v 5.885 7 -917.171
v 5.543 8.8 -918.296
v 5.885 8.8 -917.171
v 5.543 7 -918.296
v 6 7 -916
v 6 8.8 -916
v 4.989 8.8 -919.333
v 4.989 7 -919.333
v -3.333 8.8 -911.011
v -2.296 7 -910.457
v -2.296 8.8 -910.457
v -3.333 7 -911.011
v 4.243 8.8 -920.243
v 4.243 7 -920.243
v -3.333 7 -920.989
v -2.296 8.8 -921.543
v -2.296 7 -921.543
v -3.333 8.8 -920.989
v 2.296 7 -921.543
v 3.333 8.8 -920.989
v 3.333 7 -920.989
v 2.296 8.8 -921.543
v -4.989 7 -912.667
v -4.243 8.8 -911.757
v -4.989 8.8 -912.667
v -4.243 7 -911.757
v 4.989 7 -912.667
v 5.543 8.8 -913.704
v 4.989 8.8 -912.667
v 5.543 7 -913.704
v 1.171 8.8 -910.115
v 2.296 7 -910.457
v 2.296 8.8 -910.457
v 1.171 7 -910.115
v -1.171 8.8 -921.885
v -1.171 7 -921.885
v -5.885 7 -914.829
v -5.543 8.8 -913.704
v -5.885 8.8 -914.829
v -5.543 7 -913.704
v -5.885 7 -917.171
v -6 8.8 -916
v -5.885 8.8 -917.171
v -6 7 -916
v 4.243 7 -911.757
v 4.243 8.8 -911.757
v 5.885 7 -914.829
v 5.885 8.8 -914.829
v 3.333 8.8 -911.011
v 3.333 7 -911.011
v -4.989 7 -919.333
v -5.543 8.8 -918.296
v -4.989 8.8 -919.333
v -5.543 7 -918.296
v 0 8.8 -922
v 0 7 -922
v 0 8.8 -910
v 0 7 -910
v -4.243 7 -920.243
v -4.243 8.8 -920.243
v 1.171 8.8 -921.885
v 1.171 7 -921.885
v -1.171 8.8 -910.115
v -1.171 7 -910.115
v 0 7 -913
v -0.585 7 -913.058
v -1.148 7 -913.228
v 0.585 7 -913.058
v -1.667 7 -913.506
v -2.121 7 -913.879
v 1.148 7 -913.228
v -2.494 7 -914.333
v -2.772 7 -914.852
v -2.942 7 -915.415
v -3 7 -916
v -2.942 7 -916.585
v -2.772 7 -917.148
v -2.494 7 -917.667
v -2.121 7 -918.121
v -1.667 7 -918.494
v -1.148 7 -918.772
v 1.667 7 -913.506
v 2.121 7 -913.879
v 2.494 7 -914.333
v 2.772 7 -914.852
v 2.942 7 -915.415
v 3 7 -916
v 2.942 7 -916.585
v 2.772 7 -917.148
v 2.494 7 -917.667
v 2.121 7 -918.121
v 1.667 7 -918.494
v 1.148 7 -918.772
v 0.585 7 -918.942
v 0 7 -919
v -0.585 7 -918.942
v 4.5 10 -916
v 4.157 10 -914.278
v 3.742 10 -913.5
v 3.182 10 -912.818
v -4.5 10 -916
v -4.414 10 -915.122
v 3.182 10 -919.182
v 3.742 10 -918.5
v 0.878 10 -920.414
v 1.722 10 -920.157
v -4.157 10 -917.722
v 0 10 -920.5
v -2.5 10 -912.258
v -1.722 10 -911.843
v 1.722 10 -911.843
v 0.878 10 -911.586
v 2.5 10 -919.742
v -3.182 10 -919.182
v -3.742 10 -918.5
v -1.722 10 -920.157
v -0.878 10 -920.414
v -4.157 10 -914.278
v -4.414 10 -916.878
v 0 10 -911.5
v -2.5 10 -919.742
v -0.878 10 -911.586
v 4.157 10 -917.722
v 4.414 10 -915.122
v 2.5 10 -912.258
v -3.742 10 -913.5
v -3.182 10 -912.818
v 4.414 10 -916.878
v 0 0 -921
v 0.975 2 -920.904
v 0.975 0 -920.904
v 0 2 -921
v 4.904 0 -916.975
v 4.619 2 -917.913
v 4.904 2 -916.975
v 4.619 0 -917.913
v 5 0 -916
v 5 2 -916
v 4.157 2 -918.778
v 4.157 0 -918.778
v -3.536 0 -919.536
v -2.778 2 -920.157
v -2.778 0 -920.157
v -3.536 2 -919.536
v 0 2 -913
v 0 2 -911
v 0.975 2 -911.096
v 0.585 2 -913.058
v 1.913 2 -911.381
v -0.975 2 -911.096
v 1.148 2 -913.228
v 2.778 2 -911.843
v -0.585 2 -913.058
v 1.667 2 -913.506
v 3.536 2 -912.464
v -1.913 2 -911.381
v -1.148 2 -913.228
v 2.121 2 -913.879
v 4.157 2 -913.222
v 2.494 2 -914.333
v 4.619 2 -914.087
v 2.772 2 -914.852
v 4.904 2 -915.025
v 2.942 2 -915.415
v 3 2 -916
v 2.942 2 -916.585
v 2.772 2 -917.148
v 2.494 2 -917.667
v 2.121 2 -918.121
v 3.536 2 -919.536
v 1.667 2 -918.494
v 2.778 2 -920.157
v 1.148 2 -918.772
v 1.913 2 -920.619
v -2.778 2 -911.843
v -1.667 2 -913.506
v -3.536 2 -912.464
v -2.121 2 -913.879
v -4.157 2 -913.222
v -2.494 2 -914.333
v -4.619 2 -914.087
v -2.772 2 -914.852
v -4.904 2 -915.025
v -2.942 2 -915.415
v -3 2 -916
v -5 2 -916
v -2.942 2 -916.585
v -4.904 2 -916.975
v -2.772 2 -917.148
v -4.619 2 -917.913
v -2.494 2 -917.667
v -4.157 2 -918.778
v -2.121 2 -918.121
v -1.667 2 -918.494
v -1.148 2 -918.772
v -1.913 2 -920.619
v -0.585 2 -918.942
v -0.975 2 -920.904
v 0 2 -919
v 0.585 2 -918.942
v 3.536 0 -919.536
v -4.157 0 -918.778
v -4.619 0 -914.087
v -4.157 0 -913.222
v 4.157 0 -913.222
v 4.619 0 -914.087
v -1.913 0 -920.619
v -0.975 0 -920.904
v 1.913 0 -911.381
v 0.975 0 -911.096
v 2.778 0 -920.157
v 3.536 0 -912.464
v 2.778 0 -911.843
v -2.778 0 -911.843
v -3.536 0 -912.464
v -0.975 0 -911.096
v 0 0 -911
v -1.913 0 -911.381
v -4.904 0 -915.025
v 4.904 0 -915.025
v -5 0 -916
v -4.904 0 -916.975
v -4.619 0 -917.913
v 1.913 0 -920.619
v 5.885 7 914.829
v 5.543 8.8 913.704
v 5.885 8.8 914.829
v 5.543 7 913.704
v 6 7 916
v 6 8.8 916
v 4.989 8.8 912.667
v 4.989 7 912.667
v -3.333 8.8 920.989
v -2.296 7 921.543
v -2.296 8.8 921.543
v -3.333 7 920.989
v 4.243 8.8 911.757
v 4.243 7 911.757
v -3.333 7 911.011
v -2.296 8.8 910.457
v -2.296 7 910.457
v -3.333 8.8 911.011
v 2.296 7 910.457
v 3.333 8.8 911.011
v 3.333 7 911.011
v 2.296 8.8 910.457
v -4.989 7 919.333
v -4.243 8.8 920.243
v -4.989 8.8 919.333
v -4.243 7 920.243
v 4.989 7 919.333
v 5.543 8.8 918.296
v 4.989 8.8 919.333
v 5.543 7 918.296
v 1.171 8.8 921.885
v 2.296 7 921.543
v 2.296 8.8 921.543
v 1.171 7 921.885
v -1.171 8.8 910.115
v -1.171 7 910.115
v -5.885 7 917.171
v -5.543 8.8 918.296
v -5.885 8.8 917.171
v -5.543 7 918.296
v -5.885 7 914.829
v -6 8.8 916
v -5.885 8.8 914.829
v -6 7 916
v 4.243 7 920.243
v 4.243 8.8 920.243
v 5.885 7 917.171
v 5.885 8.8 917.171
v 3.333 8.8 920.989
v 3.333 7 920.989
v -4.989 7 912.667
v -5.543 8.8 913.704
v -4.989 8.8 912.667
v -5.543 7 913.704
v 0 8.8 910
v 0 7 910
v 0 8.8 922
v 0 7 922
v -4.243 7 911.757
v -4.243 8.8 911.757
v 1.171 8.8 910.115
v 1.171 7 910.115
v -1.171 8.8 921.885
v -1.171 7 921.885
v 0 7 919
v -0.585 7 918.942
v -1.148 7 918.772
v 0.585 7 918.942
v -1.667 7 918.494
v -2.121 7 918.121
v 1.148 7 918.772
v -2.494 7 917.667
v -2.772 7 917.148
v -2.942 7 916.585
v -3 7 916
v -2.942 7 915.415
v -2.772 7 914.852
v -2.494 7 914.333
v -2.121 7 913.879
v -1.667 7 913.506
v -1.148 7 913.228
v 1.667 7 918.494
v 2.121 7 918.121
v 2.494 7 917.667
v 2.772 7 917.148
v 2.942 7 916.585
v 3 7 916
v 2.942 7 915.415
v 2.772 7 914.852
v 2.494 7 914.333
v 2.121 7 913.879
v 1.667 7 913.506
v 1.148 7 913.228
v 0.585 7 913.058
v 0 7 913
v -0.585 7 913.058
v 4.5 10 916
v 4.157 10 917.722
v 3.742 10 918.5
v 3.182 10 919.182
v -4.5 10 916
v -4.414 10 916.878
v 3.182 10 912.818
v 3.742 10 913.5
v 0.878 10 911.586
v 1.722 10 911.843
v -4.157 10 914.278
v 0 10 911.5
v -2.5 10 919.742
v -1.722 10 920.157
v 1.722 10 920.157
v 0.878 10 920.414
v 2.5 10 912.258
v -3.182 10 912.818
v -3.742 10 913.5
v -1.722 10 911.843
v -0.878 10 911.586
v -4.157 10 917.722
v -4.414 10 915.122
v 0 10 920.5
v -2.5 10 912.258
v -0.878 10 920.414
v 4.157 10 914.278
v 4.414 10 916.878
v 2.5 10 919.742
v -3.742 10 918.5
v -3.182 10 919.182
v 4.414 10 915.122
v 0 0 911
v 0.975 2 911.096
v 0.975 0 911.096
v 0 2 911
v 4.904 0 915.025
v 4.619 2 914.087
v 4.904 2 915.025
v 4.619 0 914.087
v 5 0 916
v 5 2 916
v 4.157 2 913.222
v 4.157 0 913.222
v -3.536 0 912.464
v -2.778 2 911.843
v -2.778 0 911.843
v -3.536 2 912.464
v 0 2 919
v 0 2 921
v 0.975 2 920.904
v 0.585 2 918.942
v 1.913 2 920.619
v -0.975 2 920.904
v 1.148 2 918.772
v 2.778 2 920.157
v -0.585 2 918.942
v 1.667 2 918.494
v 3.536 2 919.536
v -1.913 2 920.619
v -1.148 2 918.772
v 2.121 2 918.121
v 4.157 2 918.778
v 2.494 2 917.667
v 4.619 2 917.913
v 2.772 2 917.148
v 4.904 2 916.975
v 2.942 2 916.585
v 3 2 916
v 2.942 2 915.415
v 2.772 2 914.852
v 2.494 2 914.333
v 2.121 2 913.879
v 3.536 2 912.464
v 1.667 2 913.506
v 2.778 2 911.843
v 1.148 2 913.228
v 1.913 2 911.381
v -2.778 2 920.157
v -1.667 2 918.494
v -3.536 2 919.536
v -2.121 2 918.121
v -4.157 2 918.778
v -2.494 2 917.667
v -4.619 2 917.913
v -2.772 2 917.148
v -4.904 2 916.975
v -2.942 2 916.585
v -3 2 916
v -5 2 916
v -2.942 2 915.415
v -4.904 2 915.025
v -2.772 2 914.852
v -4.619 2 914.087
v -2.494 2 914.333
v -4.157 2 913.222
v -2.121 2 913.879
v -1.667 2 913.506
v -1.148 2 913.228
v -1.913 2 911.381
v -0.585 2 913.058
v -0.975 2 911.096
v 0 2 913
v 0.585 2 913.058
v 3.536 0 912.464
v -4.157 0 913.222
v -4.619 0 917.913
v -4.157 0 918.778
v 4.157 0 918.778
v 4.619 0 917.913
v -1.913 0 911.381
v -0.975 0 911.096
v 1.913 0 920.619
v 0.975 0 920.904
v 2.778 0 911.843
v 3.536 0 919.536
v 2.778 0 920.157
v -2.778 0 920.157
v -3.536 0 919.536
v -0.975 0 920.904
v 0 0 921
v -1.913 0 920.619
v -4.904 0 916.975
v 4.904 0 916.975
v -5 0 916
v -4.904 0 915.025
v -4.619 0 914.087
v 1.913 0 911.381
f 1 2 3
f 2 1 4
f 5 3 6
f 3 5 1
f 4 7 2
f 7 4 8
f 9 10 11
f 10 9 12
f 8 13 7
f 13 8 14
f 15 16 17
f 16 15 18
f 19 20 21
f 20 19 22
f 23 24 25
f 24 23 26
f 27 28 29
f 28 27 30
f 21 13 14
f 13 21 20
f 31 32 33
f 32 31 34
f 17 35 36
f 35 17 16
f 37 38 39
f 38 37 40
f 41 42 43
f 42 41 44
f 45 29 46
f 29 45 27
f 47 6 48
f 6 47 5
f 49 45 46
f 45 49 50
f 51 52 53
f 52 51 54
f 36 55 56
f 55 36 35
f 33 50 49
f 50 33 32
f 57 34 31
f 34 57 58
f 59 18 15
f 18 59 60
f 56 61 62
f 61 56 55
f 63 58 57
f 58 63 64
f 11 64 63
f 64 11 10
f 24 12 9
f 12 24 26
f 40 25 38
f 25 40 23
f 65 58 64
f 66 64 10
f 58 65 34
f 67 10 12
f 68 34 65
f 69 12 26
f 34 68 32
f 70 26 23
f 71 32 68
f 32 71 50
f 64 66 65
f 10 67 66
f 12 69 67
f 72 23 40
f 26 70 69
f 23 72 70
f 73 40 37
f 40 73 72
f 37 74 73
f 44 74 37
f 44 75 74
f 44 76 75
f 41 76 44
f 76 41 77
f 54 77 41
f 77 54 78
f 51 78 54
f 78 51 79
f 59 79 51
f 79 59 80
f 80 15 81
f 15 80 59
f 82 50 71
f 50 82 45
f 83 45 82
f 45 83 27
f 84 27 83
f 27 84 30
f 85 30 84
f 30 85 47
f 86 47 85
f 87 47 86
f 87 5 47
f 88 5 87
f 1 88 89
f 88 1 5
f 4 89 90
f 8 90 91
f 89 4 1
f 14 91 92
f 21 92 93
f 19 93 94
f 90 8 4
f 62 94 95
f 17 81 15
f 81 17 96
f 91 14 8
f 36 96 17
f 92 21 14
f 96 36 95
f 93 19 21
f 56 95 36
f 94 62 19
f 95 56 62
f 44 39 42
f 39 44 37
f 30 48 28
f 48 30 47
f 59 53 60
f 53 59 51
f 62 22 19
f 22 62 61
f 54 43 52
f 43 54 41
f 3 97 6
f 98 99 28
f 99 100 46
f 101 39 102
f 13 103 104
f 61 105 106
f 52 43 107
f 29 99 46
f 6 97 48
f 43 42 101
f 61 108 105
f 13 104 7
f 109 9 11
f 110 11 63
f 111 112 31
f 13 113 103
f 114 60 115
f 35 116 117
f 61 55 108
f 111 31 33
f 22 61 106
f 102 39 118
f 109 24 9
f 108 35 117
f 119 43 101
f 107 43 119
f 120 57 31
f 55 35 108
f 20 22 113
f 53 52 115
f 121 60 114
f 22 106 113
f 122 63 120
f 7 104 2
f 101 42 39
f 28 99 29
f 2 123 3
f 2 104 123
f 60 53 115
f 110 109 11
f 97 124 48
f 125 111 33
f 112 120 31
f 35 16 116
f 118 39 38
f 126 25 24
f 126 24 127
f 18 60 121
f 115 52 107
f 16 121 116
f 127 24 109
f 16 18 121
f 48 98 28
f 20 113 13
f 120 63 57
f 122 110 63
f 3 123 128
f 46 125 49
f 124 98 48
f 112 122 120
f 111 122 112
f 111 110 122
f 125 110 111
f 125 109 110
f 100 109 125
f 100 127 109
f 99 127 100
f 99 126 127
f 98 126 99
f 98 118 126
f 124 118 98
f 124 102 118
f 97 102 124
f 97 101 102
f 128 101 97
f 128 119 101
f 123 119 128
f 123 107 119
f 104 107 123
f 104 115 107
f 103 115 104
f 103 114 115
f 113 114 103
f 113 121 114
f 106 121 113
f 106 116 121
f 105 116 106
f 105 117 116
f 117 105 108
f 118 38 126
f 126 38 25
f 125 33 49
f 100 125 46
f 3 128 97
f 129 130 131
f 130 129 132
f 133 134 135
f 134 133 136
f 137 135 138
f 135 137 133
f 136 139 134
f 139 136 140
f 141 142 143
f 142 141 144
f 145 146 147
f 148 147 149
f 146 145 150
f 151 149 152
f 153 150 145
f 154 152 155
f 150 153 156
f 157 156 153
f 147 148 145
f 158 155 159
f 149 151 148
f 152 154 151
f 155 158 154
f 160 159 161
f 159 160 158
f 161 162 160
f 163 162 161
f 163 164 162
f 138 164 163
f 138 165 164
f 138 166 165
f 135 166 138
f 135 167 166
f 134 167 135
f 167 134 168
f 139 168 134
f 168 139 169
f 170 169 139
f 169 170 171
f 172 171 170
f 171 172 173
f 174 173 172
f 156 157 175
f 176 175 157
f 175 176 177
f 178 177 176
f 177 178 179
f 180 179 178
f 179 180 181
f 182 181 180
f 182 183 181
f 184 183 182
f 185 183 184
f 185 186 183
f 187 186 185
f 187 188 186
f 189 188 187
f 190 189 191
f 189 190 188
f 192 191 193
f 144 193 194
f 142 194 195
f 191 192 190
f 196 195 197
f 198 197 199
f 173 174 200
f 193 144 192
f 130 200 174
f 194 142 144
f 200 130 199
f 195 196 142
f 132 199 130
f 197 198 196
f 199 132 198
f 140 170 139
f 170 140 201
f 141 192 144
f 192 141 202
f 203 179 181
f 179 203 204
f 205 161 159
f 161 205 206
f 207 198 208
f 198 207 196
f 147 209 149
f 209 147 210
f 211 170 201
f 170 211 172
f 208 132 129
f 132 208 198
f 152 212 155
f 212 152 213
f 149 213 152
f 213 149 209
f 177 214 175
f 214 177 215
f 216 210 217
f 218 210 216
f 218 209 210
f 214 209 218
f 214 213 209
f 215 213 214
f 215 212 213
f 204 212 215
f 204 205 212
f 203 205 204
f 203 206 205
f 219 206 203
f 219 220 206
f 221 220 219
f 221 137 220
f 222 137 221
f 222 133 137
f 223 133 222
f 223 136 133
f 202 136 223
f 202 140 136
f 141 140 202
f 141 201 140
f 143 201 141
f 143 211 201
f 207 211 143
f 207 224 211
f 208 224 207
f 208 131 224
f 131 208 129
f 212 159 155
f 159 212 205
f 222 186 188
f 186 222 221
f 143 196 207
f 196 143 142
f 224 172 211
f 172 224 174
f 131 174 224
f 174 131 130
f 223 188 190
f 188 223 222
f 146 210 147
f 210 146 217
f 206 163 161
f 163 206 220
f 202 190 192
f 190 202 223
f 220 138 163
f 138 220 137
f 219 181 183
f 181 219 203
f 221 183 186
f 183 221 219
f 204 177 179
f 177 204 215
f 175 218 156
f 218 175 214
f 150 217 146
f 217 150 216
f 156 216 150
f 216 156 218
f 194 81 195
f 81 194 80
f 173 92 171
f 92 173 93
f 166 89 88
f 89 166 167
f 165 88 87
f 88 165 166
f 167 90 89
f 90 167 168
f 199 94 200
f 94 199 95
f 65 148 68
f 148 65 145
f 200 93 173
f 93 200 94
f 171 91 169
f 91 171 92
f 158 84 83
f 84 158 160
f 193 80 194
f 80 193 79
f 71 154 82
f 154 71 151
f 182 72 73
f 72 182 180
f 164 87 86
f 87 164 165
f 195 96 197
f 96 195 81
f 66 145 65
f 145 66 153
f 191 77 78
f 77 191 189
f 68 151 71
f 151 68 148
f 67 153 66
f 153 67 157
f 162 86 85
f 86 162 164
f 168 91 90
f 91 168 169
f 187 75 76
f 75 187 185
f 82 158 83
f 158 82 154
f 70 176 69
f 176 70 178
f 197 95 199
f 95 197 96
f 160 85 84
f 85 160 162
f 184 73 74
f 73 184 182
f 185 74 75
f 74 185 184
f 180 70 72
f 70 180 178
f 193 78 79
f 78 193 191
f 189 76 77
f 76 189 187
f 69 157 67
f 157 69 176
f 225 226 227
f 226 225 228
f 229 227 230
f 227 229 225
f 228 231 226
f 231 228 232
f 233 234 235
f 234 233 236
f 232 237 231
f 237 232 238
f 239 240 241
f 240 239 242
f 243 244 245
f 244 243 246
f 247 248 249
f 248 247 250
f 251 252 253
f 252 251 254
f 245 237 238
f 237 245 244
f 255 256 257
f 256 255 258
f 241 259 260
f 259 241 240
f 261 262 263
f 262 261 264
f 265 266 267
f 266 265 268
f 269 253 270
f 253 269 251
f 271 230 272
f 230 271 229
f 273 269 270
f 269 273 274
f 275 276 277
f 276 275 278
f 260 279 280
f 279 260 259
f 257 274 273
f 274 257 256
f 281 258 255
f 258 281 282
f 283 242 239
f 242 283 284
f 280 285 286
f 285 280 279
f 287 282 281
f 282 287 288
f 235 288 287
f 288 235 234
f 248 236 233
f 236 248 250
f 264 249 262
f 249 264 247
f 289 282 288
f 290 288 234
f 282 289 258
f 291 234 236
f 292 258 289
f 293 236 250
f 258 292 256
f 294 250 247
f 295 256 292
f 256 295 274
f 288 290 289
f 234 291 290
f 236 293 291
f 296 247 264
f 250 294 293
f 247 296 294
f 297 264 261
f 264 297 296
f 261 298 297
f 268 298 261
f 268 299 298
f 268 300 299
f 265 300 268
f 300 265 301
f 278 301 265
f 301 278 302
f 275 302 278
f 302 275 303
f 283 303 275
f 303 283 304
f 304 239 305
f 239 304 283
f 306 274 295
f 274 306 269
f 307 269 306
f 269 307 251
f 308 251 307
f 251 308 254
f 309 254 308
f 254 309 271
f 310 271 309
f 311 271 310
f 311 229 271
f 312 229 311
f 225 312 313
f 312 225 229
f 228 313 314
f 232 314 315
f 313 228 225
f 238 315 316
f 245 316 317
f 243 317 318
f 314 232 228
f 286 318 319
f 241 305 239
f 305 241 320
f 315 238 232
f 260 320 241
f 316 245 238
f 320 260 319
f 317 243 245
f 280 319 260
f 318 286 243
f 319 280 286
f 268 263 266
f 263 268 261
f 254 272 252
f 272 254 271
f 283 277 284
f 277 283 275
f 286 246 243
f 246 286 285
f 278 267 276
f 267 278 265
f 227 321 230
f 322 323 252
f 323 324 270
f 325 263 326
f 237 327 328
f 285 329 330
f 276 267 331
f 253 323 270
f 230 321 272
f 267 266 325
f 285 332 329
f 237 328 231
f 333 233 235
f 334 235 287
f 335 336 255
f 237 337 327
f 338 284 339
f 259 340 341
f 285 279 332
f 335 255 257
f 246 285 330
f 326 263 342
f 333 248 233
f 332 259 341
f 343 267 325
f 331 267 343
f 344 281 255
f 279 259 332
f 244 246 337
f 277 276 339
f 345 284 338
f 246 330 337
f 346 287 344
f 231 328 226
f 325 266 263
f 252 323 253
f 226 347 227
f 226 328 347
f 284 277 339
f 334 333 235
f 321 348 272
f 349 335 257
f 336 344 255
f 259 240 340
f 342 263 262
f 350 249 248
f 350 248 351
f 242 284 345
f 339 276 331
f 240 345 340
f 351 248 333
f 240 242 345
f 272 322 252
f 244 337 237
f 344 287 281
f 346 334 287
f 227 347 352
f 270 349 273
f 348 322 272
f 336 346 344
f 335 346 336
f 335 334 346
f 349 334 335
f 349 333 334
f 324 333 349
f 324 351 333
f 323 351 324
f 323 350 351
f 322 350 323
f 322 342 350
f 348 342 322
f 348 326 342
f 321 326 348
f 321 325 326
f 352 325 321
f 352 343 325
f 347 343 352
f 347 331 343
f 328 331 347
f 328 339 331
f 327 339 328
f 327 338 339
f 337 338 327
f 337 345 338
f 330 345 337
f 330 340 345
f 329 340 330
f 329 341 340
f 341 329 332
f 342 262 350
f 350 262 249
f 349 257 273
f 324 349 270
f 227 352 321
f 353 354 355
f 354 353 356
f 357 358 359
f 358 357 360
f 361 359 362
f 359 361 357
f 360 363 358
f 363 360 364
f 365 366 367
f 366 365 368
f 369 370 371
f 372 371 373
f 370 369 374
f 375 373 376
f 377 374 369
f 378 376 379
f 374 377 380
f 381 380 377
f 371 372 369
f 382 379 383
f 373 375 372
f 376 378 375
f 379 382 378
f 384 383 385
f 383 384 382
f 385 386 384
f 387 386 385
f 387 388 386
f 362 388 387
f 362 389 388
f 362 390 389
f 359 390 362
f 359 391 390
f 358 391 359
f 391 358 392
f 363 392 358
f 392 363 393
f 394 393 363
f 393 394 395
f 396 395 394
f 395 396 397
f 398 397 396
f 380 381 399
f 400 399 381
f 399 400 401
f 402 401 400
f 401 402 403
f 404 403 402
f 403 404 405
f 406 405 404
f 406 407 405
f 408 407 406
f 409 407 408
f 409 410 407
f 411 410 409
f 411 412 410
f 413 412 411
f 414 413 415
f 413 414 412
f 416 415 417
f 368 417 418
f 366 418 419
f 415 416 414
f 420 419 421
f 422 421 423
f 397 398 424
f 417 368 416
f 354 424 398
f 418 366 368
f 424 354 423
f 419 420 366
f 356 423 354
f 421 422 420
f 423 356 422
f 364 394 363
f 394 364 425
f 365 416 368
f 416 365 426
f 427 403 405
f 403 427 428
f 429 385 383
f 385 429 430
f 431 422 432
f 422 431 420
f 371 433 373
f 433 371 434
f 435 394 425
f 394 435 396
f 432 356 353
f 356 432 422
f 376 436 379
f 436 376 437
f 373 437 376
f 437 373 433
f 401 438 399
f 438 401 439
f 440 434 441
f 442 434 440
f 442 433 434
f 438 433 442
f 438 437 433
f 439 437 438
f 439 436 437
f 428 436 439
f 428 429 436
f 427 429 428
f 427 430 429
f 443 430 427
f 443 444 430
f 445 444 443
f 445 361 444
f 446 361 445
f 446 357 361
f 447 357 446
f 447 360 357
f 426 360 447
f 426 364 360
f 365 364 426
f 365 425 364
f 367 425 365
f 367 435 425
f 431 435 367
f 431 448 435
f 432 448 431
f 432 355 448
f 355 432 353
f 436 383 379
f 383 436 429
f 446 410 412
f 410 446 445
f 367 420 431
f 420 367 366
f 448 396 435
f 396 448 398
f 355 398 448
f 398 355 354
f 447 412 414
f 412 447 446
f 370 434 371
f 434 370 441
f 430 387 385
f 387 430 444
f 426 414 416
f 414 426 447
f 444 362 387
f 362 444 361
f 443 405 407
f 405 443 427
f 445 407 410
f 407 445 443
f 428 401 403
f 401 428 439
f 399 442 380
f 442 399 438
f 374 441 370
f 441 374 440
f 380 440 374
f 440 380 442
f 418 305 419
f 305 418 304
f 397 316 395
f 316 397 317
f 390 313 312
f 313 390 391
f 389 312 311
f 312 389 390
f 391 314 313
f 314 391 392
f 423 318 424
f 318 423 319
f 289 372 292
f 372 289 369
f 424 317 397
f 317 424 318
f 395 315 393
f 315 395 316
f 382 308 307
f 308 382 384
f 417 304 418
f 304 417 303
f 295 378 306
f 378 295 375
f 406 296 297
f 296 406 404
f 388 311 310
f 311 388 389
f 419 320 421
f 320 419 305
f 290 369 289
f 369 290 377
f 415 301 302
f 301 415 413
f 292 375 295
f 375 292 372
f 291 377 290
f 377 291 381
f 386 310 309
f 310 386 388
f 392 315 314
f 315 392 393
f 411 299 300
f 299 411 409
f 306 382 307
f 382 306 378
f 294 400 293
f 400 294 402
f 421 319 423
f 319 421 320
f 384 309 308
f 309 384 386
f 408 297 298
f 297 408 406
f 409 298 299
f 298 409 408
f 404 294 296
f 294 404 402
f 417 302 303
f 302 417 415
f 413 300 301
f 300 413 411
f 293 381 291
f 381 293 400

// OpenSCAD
// =====================================================================
// sub_mounting_pegs.scad
// APC NetShelter Rack PDU Advanced 100A (APDU11590SM)
// 2x toolless round mounting button (rear side, pitch 1832.0 mm)
// Origin: bidang muka belakang chassis (Y=0), sumbu peg ke +Y,
//         Z=0 di tengah jarak kedua peg.
// =====================================================================

$fn = 32;

PEG_SPACING = 1832.0;    // jarak center-to-center vertikal
PEG_HEAD_DIA = 12.0;     // kepala jamur
PEG_HEAD_T = 3.0;
PEG_NECK_DIA = 6.0;
PEG_NECK_H = 5.0;
PEG_BASE_DIA = 10.0;
PEG_BASE_T = 2.0;

module mounting_peg() {
    col = [0.55, 0.56, 0.58];   // baja seng
    color(col)
        rotate([-90, 0, 0]) {   // sumbu silinder -> +Y
            // basis
            cylinder(d = PEG_BASE_DIA, h = PEG_BASE_T);
            // leher
            translate([0, 0, PEG_BASE_T])
                cylinder(d = PEG_NECK_DIA, h = PEG_NECK_H);
            // kepala jamur dengan chamfer atas
            translate([0, 0, PEG_BASE_T + PEG_NECK_H]) {
                cylinder(d = PEG_HEAD_DIA, h = PEG_HEAD_T - 1.2);
                translate([0, 0, PEG_HEAD_T - 1.2])
                    cylinder(d1 = PEG_HEAD_DIA, d2 = PEG_HEAD_DIA - 3,
                             h = 1.2, $fn = 32);
            }
        }
}

module sub_mounting_pegs(spacing = PEG_SPACING) {
    for (z = [-spacing/2, spacing/2])
        translate([0, 0, z])
            mounting_peg();
}

// Preview standalone
sub_mounting_pegs();
